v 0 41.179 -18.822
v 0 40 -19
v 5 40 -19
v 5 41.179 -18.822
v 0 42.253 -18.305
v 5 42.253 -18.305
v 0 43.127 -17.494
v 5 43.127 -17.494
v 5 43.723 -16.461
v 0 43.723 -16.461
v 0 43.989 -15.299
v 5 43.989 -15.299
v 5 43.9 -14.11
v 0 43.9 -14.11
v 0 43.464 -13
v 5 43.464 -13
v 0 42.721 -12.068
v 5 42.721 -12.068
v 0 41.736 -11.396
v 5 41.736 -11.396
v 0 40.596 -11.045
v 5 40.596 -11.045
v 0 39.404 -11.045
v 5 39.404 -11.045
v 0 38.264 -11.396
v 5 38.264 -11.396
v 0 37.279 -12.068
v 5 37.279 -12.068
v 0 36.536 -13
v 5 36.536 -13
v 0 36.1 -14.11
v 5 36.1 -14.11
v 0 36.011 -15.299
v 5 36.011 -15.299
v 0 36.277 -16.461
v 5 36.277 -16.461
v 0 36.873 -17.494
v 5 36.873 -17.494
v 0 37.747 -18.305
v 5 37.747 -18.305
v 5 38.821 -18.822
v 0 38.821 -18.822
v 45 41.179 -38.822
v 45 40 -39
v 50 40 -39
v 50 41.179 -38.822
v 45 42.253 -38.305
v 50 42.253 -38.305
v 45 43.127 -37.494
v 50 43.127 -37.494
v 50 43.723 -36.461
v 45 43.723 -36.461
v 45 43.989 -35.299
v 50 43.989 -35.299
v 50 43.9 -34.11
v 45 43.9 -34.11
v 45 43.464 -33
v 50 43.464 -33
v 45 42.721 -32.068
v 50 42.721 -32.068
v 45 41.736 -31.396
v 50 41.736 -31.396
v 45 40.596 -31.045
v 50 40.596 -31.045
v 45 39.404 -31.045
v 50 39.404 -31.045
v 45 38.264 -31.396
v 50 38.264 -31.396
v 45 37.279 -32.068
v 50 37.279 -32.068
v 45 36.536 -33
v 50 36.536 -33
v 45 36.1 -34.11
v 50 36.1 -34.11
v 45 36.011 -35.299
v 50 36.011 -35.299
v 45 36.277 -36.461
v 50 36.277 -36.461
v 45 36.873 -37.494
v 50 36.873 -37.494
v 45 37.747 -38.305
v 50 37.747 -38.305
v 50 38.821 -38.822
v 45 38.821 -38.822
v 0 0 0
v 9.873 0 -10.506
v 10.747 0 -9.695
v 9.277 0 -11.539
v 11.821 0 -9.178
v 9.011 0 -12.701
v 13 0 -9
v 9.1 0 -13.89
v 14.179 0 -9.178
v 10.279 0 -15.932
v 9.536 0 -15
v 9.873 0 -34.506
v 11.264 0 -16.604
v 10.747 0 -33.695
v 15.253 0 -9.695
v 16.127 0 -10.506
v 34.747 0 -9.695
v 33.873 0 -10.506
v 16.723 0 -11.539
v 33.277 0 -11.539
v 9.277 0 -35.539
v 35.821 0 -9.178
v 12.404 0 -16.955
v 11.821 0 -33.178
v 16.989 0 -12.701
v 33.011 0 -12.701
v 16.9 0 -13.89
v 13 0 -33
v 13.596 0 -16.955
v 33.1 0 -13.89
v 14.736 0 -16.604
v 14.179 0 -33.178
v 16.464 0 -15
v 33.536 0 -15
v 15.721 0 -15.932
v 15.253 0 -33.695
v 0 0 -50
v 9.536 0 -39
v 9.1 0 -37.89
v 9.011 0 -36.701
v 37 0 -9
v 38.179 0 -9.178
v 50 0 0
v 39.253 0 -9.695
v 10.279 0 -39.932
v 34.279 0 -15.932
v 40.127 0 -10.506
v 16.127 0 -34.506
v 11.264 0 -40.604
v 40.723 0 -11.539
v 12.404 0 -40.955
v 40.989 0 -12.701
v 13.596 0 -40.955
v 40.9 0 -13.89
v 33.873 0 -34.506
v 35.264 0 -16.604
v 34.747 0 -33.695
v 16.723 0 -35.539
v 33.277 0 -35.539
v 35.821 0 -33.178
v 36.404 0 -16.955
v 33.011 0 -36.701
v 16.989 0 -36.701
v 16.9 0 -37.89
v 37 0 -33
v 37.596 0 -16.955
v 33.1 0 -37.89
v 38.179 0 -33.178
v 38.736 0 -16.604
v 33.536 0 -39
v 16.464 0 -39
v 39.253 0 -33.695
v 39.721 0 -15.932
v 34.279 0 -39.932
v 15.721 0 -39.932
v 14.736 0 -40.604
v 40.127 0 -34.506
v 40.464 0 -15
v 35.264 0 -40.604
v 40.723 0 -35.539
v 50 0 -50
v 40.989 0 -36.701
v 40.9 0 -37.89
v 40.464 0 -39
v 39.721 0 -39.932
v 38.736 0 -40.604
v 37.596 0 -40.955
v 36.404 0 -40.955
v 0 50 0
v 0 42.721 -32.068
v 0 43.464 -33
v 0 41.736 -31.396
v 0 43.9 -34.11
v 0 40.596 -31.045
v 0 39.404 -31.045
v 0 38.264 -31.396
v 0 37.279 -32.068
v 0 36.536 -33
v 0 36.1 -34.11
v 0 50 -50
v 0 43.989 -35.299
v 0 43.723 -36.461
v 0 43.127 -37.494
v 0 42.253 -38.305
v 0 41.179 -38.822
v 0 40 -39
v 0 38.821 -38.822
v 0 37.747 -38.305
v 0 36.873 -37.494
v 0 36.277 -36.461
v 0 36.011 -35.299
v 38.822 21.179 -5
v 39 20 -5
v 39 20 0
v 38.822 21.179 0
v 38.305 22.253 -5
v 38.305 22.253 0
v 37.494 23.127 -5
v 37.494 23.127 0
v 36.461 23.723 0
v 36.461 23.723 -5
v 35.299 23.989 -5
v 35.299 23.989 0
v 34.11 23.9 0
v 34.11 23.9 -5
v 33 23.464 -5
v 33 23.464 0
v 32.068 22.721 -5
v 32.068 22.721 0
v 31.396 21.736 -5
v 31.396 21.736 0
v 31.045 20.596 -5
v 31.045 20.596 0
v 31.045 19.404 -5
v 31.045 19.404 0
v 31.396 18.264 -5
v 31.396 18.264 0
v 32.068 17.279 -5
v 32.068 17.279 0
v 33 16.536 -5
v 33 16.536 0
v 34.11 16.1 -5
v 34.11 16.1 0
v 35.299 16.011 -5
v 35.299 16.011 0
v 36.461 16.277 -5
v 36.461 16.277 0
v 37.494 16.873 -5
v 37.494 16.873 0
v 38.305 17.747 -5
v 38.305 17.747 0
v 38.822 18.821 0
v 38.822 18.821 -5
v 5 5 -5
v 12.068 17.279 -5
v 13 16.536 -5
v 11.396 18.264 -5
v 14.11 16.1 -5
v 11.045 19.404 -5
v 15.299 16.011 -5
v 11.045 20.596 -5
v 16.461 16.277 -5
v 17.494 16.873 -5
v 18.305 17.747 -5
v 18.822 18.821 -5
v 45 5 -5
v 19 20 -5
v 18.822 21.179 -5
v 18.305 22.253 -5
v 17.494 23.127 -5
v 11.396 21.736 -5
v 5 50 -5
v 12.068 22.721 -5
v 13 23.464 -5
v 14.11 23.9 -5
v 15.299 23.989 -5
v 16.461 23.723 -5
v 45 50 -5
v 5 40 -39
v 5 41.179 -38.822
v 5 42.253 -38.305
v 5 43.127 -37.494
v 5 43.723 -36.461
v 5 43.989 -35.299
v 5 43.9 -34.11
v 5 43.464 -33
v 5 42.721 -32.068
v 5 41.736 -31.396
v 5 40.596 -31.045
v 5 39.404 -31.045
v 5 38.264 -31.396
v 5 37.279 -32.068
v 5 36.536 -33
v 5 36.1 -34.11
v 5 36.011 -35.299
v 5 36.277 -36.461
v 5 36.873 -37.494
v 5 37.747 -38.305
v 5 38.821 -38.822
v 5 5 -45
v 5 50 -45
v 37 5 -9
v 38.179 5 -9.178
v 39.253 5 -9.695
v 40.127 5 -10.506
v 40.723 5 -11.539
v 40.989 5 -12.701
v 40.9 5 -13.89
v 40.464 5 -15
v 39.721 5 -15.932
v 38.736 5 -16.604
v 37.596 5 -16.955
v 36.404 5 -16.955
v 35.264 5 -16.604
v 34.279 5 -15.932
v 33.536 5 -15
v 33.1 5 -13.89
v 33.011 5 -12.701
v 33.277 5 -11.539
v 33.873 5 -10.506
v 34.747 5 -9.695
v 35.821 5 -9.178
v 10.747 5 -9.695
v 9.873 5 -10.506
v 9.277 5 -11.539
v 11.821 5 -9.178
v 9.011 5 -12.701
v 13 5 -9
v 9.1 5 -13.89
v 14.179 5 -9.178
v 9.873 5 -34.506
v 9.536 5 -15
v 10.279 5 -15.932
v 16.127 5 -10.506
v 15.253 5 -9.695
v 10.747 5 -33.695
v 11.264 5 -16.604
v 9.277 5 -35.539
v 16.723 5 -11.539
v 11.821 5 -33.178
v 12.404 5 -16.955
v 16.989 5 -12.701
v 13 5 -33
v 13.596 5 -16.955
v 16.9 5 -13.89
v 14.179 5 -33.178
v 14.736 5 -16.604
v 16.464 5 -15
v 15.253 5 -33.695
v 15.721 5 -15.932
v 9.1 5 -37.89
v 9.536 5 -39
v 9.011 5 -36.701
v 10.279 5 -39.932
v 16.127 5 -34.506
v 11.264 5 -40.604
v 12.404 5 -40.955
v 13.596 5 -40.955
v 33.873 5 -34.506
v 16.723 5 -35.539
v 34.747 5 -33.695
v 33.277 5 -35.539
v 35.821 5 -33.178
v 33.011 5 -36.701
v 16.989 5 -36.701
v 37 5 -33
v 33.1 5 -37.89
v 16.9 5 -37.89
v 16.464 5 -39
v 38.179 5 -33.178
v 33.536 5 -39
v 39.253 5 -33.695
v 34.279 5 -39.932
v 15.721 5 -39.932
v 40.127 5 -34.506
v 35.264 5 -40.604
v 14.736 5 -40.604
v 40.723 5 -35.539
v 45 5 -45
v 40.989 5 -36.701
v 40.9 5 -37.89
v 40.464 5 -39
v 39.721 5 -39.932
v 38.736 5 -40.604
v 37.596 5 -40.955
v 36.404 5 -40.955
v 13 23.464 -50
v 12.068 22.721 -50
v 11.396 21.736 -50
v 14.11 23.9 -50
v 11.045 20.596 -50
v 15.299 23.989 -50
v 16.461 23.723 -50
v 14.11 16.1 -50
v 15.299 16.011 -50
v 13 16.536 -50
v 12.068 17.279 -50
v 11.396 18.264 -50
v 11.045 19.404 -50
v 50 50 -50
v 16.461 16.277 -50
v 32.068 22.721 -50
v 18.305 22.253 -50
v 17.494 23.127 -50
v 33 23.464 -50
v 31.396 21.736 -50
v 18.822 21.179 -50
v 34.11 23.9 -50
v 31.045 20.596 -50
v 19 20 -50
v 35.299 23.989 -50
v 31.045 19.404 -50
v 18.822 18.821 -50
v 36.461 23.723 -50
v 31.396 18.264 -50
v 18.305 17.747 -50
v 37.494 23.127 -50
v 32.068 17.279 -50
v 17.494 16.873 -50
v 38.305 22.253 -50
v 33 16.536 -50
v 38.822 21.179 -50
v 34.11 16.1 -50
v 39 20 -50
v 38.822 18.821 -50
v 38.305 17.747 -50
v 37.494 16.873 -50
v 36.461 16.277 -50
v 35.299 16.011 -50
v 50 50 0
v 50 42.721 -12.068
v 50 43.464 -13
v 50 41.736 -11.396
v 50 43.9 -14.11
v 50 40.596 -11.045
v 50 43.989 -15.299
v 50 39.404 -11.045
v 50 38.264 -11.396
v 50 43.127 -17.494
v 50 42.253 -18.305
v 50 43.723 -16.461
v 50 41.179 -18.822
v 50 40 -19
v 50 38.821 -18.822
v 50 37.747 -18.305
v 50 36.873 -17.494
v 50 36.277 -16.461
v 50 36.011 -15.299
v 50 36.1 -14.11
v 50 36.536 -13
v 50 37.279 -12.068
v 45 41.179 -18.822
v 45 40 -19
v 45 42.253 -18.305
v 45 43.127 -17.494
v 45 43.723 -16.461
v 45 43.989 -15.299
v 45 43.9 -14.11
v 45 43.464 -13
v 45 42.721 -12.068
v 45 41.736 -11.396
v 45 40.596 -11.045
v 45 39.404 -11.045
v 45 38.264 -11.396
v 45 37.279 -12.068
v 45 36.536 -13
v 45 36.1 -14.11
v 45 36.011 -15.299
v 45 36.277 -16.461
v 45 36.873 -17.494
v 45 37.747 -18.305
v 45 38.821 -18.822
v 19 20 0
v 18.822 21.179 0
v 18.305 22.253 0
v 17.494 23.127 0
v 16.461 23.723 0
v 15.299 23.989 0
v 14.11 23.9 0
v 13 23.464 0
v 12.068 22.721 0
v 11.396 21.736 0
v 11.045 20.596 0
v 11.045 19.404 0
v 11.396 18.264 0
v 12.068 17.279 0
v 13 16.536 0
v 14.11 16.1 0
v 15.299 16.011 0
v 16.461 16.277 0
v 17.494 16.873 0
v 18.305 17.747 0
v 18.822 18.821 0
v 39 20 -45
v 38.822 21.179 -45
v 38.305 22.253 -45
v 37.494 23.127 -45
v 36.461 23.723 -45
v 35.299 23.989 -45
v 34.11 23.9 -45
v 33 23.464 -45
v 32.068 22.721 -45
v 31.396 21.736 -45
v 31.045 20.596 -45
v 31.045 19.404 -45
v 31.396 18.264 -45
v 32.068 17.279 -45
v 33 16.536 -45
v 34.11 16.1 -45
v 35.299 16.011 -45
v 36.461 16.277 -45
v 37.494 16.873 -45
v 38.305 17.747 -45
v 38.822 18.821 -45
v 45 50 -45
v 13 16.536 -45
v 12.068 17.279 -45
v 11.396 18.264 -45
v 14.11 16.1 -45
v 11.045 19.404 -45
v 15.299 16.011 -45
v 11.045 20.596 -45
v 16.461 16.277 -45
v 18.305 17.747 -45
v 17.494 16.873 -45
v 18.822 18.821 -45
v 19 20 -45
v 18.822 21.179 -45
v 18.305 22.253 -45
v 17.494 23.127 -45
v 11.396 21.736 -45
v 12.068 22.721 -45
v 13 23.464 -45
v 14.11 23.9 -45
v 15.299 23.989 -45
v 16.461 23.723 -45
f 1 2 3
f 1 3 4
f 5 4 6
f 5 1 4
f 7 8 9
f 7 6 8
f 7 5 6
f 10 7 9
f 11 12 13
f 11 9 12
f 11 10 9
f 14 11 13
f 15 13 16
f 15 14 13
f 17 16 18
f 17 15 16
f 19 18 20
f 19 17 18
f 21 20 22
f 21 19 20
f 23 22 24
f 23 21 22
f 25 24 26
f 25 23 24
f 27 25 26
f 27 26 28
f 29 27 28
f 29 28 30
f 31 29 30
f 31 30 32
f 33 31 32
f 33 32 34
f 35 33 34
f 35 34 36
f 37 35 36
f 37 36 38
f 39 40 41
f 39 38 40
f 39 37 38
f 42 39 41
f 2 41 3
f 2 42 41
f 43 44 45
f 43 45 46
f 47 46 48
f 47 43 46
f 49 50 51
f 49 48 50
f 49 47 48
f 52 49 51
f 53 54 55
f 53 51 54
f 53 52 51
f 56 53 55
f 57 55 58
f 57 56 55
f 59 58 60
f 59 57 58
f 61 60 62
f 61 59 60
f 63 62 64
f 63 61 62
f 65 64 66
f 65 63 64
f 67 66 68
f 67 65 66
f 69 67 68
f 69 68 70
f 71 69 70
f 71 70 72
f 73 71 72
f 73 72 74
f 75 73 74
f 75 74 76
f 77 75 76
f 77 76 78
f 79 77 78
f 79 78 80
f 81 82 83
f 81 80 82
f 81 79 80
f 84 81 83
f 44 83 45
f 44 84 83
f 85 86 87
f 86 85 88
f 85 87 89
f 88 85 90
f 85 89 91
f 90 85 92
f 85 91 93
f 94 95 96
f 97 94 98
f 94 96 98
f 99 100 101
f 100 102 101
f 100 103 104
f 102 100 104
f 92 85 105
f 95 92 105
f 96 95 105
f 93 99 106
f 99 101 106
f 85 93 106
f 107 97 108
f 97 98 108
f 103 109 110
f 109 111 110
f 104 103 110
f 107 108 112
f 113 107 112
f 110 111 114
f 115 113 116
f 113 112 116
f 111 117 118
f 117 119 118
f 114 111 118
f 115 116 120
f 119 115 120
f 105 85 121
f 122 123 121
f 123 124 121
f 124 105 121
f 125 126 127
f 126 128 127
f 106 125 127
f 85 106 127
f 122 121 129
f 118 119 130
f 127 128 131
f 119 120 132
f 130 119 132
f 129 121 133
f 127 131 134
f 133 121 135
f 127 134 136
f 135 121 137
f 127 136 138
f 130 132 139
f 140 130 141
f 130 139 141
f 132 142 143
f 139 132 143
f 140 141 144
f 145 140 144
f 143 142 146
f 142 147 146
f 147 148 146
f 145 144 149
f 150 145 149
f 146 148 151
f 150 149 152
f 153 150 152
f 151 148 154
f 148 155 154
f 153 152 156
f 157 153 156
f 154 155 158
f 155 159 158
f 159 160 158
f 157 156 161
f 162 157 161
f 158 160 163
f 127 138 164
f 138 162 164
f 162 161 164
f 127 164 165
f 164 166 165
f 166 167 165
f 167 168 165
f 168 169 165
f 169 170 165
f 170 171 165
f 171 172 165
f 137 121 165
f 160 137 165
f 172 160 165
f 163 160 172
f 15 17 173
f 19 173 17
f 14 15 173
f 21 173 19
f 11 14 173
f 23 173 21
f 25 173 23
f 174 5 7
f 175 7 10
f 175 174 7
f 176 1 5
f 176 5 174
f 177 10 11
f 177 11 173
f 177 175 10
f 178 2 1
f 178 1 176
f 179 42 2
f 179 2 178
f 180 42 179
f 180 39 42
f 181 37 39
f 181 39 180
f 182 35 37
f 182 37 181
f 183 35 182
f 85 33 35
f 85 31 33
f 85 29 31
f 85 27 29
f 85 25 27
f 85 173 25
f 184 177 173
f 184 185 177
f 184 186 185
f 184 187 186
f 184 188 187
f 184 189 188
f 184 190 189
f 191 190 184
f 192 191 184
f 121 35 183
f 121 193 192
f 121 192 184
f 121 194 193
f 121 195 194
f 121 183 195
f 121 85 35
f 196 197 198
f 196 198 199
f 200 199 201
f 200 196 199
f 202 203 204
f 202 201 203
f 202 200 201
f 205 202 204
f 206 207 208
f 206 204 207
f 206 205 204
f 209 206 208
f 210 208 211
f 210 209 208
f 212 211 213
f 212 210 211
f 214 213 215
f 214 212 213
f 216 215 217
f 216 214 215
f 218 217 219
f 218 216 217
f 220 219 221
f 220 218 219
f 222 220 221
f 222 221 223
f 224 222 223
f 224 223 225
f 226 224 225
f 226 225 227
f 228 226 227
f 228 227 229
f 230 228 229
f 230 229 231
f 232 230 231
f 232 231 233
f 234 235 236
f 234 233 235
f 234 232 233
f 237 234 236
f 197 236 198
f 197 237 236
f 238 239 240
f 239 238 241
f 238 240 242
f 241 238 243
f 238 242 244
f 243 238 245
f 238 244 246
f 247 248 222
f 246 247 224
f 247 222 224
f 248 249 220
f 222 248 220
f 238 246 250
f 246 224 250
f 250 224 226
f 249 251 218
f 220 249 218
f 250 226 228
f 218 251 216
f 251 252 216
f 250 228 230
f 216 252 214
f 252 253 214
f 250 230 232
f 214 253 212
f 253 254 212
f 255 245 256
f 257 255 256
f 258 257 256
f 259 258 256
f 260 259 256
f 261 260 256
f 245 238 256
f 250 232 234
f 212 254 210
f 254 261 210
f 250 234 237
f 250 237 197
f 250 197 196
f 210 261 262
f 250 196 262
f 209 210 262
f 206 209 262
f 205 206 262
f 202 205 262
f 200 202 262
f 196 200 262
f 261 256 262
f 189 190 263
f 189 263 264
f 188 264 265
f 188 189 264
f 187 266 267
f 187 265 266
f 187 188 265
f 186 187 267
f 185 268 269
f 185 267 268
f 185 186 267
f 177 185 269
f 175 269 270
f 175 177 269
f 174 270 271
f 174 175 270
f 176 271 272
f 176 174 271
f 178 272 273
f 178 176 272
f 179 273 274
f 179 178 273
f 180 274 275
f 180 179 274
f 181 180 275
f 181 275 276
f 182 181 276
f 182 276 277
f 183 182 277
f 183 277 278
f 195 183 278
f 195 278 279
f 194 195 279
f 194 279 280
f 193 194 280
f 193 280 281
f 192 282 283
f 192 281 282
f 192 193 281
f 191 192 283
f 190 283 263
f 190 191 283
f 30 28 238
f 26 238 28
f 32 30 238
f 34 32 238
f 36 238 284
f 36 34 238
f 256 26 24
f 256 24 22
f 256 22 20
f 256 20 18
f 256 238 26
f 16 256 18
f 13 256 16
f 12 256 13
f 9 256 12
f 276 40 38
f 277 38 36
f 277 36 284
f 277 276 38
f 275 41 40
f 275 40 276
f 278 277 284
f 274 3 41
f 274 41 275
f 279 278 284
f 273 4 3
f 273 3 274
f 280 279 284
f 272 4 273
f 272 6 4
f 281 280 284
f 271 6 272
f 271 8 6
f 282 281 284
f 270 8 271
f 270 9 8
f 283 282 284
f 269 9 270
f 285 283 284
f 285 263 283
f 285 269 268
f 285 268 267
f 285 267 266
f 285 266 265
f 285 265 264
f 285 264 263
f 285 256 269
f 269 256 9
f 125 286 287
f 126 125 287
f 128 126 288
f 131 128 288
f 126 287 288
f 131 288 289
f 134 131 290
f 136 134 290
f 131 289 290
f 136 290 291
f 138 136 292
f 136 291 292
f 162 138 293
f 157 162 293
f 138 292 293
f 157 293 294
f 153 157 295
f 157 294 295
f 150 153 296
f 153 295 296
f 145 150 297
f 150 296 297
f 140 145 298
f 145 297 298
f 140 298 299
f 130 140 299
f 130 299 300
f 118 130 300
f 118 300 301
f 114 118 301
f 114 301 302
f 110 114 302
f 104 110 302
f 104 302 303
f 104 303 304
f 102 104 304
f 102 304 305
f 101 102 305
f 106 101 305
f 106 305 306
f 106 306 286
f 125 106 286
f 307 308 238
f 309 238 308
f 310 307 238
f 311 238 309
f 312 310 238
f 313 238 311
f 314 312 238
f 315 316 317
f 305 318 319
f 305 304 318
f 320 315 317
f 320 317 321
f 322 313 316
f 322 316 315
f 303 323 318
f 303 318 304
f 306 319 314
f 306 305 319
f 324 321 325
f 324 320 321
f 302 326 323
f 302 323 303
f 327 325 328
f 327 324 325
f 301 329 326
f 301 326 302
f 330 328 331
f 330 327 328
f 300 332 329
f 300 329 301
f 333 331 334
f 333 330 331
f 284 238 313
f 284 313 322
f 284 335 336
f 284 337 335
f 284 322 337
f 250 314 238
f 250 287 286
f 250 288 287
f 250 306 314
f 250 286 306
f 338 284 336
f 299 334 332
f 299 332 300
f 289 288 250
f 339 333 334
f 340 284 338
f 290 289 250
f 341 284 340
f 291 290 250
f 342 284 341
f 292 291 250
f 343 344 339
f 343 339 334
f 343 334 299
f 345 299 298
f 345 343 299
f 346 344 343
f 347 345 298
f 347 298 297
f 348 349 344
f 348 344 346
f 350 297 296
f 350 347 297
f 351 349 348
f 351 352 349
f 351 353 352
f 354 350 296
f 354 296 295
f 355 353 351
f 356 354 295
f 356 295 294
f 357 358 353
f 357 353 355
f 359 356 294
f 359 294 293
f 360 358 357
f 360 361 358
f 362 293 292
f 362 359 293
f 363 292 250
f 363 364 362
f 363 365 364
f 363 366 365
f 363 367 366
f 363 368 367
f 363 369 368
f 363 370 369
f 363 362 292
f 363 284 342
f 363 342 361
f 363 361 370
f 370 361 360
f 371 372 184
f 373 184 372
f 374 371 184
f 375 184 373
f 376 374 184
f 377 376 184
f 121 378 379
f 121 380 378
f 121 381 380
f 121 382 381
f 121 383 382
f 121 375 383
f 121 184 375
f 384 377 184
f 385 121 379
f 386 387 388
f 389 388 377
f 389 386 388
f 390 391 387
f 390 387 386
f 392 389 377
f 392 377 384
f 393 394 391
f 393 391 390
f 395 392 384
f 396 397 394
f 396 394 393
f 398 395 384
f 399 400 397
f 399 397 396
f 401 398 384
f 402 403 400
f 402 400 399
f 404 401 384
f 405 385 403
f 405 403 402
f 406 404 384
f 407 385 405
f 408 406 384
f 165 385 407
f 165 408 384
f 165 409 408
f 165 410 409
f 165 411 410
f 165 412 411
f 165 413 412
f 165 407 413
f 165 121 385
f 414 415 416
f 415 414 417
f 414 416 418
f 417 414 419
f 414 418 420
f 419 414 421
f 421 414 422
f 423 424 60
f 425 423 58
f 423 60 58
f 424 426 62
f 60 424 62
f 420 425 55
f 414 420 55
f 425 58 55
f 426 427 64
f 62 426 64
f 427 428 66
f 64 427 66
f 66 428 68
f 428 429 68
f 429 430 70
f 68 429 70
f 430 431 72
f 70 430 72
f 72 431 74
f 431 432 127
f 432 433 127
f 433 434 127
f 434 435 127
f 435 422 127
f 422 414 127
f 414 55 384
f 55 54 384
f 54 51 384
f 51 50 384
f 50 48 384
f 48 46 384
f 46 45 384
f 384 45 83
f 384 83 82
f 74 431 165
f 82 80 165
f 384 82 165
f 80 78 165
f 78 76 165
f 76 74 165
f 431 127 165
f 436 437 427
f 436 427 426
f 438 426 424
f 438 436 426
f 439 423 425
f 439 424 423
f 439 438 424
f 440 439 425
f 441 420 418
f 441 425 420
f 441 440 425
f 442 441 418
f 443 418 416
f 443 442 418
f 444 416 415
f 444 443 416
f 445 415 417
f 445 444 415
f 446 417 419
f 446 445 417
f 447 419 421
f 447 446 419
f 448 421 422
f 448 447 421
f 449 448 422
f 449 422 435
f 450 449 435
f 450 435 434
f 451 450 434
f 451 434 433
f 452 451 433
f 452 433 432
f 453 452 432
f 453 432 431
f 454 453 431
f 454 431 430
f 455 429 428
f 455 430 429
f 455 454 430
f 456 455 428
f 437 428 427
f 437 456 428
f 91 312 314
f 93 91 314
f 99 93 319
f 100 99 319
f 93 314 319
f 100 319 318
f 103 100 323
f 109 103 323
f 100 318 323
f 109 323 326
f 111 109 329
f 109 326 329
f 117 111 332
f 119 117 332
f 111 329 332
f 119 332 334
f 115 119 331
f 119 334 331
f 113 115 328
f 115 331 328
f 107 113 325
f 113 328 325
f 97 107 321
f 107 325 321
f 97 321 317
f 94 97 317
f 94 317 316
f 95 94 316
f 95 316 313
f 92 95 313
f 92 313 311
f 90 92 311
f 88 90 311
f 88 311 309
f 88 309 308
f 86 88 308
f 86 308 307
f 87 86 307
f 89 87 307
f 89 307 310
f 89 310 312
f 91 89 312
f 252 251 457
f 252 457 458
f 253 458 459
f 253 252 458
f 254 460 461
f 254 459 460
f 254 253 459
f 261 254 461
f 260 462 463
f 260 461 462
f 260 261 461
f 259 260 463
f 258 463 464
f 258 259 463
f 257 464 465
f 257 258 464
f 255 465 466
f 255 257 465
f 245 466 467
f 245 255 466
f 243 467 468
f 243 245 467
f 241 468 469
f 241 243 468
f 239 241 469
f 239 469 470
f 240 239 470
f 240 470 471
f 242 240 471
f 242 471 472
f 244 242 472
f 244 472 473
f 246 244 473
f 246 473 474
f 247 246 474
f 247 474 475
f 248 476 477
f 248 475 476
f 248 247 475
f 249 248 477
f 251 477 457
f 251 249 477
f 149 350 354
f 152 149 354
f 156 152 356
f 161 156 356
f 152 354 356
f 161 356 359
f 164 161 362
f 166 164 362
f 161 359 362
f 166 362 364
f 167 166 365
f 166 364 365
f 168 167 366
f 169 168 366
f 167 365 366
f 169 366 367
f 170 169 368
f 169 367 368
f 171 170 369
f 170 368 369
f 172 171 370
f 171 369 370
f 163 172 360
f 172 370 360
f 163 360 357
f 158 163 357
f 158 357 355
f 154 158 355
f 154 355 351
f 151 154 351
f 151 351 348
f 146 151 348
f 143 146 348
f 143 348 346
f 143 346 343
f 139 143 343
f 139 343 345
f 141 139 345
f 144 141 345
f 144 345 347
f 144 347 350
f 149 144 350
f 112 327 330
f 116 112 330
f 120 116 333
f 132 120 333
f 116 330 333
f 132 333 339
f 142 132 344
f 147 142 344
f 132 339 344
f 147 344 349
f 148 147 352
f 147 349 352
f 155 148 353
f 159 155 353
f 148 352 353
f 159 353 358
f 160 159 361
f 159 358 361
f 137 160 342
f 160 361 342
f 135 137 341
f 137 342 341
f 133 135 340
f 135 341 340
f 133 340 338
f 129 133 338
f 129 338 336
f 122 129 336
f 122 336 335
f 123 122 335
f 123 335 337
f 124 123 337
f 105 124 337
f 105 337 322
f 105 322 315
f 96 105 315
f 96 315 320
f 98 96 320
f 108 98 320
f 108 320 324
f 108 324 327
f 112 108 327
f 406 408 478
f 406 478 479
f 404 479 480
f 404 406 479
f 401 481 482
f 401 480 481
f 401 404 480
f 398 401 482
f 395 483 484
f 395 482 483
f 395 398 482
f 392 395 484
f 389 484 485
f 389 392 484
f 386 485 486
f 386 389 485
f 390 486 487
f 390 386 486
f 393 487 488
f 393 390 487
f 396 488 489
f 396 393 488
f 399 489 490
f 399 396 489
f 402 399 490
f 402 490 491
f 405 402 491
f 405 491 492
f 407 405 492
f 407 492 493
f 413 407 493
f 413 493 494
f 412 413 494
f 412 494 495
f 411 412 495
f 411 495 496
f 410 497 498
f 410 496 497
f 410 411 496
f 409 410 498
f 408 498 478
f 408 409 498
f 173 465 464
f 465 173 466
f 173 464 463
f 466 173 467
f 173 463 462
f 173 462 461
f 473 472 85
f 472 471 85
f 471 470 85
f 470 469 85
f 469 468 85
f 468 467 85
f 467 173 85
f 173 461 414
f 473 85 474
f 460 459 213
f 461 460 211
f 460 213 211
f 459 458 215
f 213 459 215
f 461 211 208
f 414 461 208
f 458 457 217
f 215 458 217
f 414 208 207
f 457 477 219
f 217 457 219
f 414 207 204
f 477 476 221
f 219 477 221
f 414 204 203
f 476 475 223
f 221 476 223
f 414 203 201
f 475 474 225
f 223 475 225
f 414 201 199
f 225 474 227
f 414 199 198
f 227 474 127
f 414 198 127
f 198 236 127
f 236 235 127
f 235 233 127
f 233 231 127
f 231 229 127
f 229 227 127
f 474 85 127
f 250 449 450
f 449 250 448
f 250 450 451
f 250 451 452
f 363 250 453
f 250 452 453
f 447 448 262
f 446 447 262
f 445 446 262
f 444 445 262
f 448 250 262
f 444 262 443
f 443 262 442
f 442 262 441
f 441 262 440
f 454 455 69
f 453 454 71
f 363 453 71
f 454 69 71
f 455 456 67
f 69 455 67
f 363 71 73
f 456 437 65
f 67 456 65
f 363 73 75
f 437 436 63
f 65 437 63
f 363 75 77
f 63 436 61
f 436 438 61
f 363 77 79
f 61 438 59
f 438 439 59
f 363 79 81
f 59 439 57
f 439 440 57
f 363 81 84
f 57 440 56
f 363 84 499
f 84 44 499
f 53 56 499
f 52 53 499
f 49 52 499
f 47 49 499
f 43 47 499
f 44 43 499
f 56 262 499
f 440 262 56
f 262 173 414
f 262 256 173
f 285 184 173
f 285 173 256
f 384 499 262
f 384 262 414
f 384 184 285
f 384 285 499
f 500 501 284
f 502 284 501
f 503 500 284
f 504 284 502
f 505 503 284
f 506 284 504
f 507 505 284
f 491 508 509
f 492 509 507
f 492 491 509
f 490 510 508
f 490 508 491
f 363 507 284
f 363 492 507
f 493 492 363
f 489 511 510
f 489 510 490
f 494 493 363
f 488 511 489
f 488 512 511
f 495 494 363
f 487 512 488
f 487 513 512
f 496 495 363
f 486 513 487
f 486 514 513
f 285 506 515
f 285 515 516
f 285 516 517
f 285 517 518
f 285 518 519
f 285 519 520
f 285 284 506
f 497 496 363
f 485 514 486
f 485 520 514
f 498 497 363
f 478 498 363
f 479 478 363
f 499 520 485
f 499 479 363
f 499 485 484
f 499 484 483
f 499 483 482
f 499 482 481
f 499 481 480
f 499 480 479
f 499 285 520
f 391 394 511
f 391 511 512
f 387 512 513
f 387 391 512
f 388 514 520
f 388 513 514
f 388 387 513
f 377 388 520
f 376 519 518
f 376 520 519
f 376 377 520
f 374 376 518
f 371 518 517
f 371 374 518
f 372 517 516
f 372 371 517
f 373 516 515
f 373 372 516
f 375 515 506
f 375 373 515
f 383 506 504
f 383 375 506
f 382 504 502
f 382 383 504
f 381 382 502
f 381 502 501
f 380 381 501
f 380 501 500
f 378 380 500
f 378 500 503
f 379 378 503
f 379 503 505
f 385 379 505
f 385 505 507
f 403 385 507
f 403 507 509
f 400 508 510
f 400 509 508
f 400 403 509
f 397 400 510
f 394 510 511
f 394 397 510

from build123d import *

# Parameters (mm, degrees)
SKETCH1_W               = 50
SKETCH1_H               = 50
BOSS_EXTRUDE1_DEPTH     = 50
SKETCH2_W               = 40
SKETCH2_H               = 40
CUT_EXTRUDE1_DEPTH      = 45
SKETCH3_R               = 4
CUT_EXTRUDE2_DEPTH      = 45
CUT_EXTRUDE3_DEPTH      = 87.602540378
CUT_EXTRUDE3_DEPTH_BACK = 87.602540378
SKETCH4_R               = 4
CUT_EXTRUDE4_DEPTH      = 87.602540378
CUT_EXTRUDE4_DEPTH_BACK = 87.602540378
SKETCH5_R               = 4


with BuildPart() as part:
    # Sketch1 → Boss-Extrude1 (new body)
    with BuildSketch(Plane(origin=(0, 0, 0), x_dir=(1, 0, 0), z_dir=(0, 1, 0))):
        with Locations((25, 25)):
            Rectangle(SKETCH1_W, SKETCH1_H)
    extrude(amount=BOSS_EXTRUDE1_DEPTH)

    # Sketch2 → Cut-Extrude1 (cut)
    with BuildSketch(Plane(origin=(0, 50, 0), x_dir=(1, 0, 0), z_dir=(0, 1, 0))):
        with Locations((25, 25)):
            Rectangle(SKETCH2_W, SKETCH2_H)
    extrude(amount=-CUT_EXTRUDE1_DEPTH, mode=Mode.SUBTRACT)

    # Sketch3 → Cut-Extrude2 (cut)
    with BuildSketch(Plane(origin=(0, 5, 0), x_dir=(1, 0, 0), z_dir=(0, 1, 0))):
        with Locations(Location((13, 37, 0), (0, 0, 270))):
            Circle(SKETCH3_R)
        with Locations(Location((37, 37, 0), (0, 0, 270))):
            Circle(SKETCH3_R)
        with Locations(Location((13, 13, 0), (0, 0, 270))):
            Circle(SKETCH3_R)
        with Locations(Location((37, 13, 0), (0, 0, 270))):
            Circle(SKETCH3_R)
    extrude(amount=-CUT_EXTRUDE2_DEPTH, mode=Mode.SUBTRACT)

    # Sketch4 → Cut-Extrude3 (cut, two sides: drawn at the far end of the back side and taken through both)
    with BuildSketch(Plane.XY.offset(-CUT_EXTRUDE3_DEPTH_BACK)):
        with Locations((15, 20)):
            Circle(SKETCH4_R)
        with Locations((35, 20)):
            Circle(SKETCH4_R)
    extrude(amount=CUT_EXTRUDE3_DEPTH + CUT_EXTRUDE3_DEPTH_BACK, mode=Mode.SUBTRACT)

    # Sketch5 → Cut-Extrude4 (cut, two sides: drawn at the far end of the back side and taken through both)
    with BuildSketch(Plane(origin=(50, 0, 0), x_dir=(0, 0, -1), z_dir=(1, 0, 0)).offset(-CUT_EXTRUDE4_DEPTH_BACK)):
        with Locations((15, 40)):
            Circle(SKETCH5_R)
        with Locations((35, 40)):
            Circle(SKETCH5_R)
    extrude(amount=CUT_EXTRUDE4_DEPTH + CUT_EXTRUDE4_DEPTH_BACK, mode=Mode.SUBTRACT)


solid = part.part
